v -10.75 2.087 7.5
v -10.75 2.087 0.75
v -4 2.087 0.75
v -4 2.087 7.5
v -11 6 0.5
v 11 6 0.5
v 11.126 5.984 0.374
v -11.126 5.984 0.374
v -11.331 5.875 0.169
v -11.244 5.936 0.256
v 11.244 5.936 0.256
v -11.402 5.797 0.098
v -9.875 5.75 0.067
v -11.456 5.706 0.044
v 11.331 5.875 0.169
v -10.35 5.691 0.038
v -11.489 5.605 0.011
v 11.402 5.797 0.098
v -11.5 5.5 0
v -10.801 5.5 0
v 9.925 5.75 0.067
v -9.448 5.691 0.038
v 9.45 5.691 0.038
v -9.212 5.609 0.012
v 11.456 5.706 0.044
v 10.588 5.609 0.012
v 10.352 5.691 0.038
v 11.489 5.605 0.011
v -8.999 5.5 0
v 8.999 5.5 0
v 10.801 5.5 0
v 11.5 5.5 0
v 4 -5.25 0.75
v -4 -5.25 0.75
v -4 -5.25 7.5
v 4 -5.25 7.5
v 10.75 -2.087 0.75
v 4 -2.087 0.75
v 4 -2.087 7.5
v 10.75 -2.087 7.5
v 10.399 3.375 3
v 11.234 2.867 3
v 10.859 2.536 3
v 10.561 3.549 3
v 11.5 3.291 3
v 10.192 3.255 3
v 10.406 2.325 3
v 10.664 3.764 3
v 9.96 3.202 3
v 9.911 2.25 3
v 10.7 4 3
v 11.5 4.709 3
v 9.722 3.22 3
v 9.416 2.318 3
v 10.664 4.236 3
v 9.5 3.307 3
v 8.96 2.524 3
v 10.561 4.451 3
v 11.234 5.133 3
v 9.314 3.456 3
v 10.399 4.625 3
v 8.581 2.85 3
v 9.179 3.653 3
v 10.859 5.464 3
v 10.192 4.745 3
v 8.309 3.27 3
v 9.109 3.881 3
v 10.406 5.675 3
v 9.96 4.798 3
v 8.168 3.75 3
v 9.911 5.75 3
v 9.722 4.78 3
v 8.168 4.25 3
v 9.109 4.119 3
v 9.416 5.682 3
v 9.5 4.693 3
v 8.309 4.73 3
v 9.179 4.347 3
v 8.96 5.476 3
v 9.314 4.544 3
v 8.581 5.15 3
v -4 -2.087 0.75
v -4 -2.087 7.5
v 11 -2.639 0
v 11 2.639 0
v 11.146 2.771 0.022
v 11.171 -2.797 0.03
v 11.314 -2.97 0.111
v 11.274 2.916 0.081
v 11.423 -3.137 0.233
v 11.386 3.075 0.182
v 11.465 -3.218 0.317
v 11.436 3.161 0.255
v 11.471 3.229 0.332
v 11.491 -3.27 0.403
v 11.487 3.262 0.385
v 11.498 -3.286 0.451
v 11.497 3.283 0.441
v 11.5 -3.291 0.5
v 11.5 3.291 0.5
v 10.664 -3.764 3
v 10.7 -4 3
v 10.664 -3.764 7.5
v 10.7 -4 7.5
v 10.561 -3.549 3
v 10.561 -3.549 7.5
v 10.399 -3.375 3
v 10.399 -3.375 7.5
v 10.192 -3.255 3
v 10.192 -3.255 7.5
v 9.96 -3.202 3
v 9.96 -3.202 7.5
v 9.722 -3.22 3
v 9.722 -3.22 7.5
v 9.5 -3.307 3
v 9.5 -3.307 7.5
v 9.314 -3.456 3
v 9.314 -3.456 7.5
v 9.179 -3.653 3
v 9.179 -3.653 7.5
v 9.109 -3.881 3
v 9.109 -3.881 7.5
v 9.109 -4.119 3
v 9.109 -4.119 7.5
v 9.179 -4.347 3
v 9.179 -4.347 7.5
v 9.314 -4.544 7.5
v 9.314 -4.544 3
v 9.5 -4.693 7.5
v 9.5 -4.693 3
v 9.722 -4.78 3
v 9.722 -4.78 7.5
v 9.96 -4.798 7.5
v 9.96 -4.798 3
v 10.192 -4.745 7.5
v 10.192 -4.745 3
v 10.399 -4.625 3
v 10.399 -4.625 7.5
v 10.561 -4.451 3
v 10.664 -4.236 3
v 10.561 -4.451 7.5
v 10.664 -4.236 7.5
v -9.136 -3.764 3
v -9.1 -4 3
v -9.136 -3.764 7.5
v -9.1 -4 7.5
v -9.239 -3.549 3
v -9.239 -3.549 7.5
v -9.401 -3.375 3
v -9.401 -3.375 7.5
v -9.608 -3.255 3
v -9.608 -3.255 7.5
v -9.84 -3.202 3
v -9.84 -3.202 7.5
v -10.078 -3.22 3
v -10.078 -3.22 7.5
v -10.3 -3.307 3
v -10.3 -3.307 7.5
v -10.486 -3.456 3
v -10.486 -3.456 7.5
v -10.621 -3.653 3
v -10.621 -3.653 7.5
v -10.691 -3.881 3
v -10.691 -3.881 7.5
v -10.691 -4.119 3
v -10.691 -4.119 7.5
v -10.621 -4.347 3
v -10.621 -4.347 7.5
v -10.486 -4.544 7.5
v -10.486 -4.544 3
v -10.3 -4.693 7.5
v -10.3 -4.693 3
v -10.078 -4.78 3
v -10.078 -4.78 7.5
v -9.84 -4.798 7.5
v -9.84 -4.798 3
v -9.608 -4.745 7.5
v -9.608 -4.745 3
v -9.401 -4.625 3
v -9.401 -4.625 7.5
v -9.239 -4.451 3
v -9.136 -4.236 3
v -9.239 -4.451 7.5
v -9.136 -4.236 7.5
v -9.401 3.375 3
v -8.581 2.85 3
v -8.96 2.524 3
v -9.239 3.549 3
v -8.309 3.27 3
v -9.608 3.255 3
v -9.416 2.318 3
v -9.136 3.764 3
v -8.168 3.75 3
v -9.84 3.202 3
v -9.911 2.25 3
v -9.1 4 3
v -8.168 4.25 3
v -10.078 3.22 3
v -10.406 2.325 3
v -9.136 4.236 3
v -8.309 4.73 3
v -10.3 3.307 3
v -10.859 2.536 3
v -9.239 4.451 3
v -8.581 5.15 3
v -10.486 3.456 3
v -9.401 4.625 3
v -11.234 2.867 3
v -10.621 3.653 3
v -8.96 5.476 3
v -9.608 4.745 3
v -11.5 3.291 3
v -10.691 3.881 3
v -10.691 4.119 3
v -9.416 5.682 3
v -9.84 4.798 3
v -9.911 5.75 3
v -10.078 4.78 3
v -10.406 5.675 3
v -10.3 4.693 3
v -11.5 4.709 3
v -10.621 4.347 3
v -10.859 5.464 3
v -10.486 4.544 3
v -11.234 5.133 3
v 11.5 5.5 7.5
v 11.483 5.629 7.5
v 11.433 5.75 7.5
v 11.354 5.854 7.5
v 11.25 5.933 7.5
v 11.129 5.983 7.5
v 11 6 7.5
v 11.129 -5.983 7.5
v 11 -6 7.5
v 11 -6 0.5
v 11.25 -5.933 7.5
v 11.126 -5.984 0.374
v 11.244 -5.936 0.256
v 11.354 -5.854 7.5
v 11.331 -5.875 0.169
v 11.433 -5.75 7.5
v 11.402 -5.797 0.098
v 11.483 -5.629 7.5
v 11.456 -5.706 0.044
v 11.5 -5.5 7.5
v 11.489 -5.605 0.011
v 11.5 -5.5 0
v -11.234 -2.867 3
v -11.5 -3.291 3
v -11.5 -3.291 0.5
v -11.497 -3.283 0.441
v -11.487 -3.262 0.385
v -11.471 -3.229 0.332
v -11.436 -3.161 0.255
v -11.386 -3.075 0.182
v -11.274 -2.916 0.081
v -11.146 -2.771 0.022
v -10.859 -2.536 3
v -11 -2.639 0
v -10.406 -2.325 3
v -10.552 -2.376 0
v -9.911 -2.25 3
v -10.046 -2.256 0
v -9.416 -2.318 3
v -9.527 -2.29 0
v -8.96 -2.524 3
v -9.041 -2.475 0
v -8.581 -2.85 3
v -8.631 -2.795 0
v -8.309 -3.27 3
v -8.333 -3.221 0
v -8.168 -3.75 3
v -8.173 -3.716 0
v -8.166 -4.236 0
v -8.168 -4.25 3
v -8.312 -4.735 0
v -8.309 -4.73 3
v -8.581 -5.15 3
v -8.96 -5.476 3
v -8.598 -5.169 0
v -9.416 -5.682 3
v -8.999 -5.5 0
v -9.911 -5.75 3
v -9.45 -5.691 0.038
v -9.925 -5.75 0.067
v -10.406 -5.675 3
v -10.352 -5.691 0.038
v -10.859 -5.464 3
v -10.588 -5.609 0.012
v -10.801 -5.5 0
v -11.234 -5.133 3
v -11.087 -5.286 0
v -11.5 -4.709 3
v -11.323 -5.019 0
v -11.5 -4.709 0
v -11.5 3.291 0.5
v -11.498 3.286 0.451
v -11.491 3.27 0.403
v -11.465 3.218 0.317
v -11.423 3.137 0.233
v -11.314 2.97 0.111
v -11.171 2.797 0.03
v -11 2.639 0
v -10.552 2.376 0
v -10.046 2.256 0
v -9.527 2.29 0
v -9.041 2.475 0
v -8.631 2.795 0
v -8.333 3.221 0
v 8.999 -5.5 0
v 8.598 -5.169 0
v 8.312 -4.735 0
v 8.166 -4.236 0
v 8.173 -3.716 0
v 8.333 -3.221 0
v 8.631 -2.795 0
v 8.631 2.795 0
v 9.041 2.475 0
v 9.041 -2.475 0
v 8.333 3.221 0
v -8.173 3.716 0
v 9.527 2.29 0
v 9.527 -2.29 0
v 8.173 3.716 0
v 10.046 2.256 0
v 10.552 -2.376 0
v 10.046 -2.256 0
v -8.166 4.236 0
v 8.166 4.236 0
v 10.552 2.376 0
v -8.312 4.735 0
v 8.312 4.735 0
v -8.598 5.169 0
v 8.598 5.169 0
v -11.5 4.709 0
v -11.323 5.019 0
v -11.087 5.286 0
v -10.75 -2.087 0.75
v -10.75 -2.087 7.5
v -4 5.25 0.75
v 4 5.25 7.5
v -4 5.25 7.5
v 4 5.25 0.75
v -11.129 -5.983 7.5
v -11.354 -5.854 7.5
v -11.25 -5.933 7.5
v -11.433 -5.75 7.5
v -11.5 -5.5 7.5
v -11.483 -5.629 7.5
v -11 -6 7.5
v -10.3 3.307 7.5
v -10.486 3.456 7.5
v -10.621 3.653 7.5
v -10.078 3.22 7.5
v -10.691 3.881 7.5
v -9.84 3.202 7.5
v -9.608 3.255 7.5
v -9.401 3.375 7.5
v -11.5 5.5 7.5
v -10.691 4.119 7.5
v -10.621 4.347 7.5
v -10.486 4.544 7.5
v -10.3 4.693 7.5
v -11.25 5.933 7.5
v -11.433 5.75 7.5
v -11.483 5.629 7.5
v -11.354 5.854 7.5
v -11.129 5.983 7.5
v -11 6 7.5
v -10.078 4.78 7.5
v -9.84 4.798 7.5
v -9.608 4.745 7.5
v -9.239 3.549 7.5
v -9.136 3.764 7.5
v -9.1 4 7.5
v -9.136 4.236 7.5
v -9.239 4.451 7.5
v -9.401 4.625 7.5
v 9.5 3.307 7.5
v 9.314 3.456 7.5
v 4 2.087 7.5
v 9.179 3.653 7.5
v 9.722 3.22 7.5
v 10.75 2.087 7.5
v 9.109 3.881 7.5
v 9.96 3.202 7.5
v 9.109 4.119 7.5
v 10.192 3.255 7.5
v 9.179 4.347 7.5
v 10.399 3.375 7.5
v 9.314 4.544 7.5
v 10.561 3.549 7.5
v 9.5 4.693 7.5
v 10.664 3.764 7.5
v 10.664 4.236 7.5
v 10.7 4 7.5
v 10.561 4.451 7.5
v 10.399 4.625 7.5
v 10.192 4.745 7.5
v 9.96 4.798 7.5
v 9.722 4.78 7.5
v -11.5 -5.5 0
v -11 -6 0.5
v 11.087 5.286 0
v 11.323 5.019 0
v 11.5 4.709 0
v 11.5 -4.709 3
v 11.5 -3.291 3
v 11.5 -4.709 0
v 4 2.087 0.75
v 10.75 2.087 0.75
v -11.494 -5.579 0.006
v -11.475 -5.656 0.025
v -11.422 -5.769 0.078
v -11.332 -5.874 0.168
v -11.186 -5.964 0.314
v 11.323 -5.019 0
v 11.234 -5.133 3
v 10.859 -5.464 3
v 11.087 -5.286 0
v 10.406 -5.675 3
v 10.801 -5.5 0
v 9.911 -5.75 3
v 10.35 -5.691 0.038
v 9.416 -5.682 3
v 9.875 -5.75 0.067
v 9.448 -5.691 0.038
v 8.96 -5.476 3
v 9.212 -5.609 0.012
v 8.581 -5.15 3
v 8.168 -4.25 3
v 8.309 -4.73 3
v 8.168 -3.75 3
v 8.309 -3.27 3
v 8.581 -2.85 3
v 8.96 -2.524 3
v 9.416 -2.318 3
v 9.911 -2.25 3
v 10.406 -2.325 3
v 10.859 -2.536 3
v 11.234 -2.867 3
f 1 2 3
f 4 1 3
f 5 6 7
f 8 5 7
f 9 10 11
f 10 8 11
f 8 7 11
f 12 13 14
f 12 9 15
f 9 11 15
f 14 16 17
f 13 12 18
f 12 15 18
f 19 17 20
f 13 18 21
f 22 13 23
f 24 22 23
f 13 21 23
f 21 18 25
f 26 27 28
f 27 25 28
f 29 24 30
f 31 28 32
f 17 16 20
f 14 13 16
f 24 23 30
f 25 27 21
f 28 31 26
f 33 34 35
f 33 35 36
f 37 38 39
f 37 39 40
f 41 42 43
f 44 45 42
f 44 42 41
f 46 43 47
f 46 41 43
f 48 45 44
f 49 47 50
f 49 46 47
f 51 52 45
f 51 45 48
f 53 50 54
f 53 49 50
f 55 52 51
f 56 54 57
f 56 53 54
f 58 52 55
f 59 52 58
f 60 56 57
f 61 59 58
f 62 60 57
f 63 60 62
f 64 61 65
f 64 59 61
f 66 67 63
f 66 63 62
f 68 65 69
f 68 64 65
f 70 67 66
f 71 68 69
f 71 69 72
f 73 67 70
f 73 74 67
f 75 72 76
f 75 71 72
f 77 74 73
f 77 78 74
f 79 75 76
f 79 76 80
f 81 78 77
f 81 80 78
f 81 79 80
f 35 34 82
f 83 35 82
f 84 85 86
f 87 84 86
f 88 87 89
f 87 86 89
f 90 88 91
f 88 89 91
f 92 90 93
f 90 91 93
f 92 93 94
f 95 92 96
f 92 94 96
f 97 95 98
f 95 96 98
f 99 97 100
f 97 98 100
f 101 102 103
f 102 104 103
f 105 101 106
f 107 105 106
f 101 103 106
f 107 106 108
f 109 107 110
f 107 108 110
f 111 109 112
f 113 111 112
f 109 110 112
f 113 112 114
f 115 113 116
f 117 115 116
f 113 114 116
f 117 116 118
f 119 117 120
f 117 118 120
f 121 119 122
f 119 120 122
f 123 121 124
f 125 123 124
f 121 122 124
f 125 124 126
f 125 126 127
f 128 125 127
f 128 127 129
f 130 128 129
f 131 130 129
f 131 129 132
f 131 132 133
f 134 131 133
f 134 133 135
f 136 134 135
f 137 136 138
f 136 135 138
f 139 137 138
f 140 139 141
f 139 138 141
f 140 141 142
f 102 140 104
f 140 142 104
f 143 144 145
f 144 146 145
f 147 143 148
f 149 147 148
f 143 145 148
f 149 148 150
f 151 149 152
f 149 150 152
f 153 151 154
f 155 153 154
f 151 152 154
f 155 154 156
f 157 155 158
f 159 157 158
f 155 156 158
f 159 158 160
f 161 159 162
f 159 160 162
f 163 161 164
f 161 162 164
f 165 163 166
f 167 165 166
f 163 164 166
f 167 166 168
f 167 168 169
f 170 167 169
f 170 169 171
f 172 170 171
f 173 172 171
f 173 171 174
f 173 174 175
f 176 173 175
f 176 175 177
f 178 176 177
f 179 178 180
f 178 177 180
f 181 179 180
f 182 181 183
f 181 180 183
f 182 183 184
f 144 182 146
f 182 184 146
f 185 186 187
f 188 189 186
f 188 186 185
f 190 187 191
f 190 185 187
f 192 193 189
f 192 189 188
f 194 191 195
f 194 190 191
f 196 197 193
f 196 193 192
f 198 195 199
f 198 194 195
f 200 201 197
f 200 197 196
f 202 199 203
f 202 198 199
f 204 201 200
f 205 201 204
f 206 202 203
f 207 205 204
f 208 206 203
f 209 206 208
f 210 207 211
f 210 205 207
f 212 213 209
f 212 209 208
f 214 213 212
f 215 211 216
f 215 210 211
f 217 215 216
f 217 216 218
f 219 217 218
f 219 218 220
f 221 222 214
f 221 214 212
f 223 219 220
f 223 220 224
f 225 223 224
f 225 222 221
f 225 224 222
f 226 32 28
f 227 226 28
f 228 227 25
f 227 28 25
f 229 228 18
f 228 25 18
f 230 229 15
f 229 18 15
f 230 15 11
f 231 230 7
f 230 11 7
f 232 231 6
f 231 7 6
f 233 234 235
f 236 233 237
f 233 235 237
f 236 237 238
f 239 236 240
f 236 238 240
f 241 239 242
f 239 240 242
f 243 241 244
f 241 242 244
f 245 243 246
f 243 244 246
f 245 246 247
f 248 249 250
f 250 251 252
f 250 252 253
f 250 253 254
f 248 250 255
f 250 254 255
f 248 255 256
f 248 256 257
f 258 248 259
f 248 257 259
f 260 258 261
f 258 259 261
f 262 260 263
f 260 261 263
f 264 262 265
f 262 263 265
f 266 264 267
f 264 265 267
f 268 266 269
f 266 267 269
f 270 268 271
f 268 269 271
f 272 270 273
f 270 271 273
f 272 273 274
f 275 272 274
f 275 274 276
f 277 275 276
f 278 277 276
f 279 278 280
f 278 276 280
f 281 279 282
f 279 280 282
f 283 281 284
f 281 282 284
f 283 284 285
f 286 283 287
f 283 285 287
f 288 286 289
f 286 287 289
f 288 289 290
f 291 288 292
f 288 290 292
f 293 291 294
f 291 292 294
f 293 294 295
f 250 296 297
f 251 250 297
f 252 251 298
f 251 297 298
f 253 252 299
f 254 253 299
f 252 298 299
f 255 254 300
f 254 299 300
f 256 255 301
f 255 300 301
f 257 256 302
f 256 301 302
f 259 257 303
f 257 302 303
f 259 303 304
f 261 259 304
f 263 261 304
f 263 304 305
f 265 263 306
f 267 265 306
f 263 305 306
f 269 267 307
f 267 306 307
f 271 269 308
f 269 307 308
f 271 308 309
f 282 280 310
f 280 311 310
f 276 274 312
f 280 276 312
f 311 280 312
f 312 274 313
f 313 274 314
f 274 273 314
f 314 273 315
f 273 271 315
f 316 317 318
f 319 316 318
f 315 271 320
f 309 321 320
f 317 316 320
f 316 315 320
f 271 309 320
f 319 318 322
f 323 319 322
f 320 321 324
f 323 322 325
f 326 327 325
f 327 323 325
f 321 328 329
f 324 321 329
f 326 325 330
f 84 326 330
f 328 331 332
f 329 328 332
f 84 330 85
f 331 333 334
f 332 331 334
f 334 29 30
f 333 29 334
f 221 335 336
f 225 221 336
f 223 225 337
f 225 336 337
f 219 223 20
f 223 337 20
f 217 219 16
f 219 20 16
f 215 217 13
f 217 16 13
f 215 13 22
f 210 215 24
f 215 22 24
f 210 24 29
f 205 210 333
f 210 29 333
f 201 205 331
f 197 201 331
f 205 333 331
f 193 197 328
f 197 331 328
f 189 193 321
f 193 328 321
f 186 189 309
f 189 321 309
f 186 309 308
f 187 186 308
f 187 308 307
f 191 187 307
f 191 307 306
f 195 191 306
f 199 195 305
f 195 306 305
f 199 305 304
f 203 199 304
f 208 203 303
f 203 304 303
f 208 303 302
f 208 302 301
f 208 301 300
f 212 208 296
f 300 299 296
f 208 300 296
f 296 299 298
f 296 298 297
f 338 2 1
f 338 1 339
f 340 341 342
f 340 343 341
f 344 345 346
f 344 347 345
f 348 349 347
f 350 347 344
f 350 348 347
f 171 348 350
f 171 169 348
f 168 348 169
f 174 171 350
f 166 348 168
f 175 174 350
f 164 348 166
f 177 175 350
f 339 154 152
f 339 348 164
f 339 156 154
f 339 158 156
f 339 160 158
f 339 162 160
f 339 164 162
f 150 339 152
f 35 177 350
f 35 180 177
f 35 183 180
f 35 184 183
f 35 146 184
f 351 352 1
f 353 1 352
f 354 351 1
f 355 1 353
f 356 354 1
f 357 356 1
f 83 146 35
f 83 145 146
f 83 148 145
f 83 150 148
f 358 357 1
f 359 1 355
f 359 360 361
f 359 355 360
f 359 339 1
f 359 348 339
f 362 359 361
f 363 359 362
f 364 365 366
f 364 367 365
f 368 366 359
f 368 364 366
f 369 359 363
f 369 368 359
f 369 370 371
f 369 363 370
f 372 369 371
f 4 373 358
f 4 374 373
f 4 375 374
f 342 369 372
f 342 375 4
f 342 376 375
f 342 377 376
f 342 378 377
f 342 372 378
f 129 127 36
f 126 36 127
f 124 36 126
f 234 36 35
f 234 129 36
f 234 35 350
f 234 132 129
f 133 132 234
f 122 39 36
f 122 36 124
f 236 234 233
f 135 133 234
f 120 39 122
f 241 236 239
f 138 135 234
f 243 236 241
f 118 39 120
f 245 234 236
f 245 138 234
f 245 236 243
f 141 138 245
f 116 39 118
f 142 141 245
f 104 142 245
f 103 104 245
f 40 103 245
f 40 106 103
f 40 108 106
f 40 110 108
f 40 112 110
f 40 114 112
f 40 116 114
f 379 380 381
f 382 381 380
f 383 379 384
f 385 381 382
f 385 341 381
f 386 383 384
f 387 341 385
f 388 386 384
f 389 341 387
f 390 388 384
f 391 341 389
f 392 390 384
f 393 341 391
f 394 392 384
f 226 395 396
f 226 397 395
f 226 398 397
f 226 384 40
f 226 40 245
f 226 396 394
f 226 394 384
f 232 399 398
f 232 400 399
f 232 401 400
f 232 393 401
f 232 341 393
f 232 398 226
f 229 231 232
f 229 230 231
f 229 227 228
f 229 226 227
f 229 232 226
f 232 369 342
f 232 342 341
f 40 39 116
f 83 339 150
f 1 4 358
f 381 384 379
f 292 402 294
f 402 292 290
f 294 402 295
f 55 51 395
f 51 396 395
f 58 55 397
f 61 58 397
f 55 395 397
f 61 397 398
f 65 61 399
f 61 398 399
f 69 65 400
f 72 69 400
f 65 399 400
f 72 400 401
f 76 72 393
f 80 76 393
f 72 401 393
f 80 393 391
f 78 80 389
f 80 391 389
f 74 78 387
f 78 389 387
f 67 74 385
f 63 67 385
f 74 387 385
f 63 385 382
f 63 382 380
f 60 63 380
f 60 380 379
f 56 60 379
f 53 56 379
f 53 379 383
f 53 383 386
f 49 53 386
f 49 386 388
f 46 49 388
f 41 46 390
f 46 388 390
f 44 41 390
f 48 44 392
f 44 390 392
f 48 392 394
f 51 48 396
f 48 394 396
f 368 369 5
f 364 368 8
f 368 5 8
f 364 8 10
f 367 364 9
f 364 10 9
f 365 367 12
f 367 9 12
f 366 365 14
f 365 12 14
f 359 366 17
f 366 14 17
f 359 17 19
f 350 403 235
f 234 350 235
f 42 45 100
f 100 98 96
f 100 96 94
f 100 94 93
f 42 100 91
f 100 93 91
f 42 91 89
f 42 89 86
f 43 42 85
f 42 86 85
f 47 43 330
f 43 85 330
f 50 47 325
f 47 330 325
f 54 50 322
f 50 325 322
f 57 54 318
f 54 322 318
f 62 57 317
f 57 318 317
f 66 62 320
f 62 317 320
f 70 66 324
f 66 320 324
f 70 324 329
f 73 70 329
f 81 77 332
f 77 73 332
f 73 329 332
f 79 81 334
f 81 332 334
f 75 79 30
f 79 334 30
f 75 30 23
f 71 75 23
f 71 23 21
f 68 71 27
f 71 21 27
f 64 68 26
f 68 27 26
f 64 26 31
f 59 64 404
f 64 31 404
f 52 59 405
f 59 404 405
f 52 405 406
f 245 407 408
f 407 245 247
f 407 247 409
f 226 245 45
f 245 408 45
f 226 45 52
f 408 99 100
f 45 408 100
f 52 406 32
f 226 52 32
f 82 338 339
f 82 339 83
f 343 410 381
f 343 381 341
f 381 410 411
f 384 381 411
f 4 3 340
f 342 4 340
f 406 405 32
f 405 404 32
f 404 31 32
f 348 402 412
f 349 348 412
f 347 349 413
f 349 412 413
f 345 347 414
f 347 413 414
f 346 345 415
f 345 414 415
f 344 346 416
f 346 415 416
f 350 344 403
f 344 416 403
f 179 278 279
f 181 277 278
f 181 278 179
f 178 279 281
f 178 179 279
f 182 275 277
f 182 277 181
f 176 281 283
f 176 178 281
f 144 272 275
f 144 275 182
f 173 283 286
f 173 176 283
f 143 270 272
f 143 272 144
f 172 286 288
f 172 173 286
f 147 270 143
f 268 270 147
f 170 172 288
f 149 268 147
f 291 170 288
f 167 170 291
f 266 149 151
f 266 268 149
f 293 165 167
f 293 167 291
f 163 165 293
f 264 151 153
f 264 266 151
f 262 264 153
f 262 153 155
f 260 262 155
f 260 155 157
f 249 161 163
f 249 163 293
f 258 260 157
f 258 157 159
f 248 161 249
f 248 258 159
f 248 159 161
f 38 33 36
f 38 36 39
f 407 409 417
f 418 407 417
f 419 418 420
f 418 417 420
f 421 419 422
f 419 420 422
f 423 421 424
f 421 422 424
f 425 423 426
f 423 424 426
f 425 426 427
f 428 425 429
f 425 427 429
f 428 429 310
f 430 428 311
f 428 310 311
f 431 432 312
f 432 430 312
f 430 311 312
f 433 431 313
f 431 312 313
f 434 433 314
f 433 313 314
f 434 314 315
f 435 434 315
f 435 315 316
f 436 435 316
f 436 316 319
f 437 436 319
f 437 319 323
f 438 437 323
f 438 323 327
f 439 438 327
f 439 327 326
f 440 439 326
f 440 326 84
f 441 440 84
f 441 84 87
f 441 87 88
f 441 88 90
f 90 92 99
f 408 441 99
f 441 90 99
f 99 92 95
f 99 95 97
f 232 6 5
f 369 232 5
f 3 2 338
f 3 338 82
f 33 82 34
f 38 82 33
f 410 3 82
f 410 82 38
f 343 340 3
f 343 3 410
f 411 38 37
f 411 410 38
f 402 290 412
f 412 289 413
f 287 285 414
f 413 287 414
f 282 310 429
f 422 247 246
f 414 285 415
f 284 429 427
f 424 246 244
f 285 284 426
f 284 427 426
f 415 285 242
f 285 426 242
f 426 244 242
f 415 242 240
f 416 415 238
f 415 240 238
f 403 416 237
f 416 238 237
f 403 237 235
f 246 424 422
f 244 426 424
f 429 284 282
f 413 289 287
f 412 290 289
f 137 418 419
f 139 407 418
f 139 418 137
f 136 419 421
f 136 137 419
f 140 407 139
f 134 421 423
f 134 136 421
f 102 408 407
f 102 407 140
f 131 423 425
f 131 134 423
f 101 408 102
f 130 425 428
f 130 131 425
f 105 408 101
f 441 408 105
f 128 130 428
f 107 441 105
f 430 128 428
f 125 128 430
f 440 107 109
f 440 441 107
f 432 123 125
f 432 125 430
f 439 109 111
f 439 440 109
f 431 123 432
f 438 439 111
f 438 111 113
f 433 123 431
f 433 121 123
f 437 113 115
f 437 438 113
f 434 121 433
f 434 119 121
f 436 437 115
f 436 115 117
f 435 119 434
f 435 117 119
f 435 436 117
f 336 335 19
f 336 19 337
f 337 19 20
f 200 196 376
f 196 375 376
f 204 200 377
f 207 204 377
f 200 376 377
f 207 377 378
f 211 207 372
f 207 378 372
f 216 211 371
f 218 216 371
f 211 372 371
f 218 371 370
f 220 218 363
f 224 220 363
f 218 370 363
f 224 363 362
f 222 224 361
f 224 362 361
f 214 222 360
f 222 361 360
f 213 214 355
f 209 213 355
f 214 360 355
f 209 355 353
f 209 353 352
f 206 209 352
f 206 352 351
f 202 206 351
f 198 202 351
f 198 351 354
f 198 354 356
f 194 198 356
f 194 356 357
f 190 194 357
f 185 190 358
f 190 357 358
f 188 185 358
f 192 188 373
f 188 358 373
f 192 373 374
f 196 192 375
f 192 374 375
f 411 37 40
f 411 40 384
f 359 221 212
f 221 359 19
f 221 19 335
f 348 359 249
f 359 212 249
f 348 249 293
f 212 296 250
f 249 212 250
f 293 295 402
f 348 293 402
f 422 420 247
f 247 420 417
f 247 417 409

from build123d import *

# Parameters (mm, degrees)
SKETCH1_W           = 7.5
SKETCH1_H           = 3.913043478
BOSS_EXTRUDE1_DEPTH = 7.5
SHELL2_T            = -0.75
SKETCH1_4_W         = 7.5
SKETCH1_4_H         = 3.913043478
BOSS_EXTRUDE2_DEPTH = 7.5
HOLE2_D             = 1.6
HOLE2_DEPTH         = 10
HOLE2_CBORE_D       = 3.5
HOLE2_CBORE_DEPTH   = 3
FILLET1_R           = 0.5


with BuildPart() as part:
    # Sketch1 → Boss-Extrude1 (new body)
    with BuildSketch(Plane.XY):
        Polygon((4, 2.086956522), (4, 6), (-4, 6), (-4, 2.086956522), (-11.5, 2.086956522), (-11.5, -2.086956522), (-4, -2.086956522), (-4, -6), (4, -6), (4, -2.086956522), (11.5, -2.086956522), (11.5, 2.086956522), align=None)
        with Locations((-7.75, 4.043478261)):
            Rectangle(SKETCH1_W, SKETCH1_H)
        with Locations((7.75, 4.043478261)):
            Rectangle(SKETCH1_W, SKETCH1_H)
        with Locations((-7.75, -4.043478261)):
            Rectangle(SKETCH1_W, SKETCH1_H)
        with Locations((7.75, -4.043478261)):
            Rectangle(SKETCH1_W, SKETCH1_H)
    extrude(amount=BOSS_EXTRUDE1_DEPTH)

    # Shell2
    shell2_openings = [part.faces().sort_by_distance(p)[0] for p in [
        (0, 0, 7.5),
    ]]
    offset(amount=SHELL2_T, openings=shell2_openings, kind=Kind.INTERSECTION)

    # Sketch1<4> → Boss-Extrude2 (add)
    with BuildSketch(Plane.XY):
        with Locations((7.75, 4.043478261)):
            Rectangle(SKETCH1_4_W, SKETCH1_4_H)
        with Locations((-7.75, 4.043478261)):
            Rectangle(SKETCH1_4_W, SKETCH1_4_H)
        with Locations((-7.75, -4.043478261)):
            Rectangle(SKETCH1_4_W, SKETCH1_4_H)
        with Locations((7.75, -4.043478261)):
            Rectangle(SKETCH1_4_W, SKETCH1_4_H)
    extrude(amount=BOSS_EXTRUDE2_DEPTH)

    # Hole2
    with Locations(Plane(origin=(0, 0, 0), x_dir=(-1, 0, 0), z_dir=(0, 0, -1))):
        with Locations((-9.9, -4), (9.9, 4), (9.9, -4), (-9.9, 4)):
            CounterBoreHole(HOLE2_D / 2, HOLE2_CBORE_D / 2, HOLE2_CBORE_DEPTH, depth=HOLE2_DEPTH)

    # Fillet1
    # the kernel refuses this fillet: 0.5 mm, written as the material it takes off along each edge
    with BuildSketch(Plane(origin=(-11.5, 6, -1.25), x_dir=(1, 0, 0), z_dir=(0, 0, 1)), Plane(origin=(11.5, -6, -1.25), x_dir=(-1, 0, 0), z_dir=(0, 0, 1))) as fillet1_piece_1:
        with BuildLine():
            CenterArc((FILLET1_R, -FILLET1_R), FILLET1_R, 90, 90)
            Line((0, -FILLET1_R), (0, 0))
            Line((0, 0), (FILLET1_R, 0))
        make_face()
    extrude(amount=10, mode=Mode.SUBTRACT)
    with BuildSketch(Plane(origin=(-11.5, 4.541127656, 0), x_dir=(1, 0, 0), z_dir=(0, -1, 0)), Plane(origin=(11.5, 4.541127656, 0), x_dir=(0, 0, 1), z_dir=(0, -1, 0))) as fillet1_piece_2:
        with BuildLine():
            CenterArc((FILLET1_R, FILLET1_R), FILLET1_R, 180, 90)
            Line((0, FILLET1_R), (0, 0))
            Line((0, 0), (FILLET1_R, 0))
        make_face()
    extrude(amount=9.082255312, mode=Mode.SUBTRACT)
    with BuildSketch(Plane(origin=(12.75, 6, 0), x_dir=(0, 0, 1), z_dir=(-1, 0, 0))) as fillet1_piece_3:
        with BuildLine():
            CenterArc((FILLET1_R, -FILLET1_R), FILLET1_R, 90, 90)
            Line((0, -FILLET1_R), (0, 0))
            Line((0, 0), (FILLET1_R, 0))
        make_face()
    extrude(amount=25.5, mode=Mode.SUBTRACT)
    with BuildSketch(Plane(origin=(11.5, 6, -1.25), x_dir=(-1, 0, 0), z_dir=(0, 0, 1)), Plane(origin=(-11.5, -6, -1.25), x_dir=(1, 0, 0), z_dir=(0, 0, 1))) as fillet1_piece_4:
        with BuildLine():
            CenterArc((FILLET1_R, FILLET1_R), FILLET1_R, 180, 90)
            Line((0, FILLET1_R), (0, 0))
            Line((0, 0), (FILLET1_R, 0))
        make_face()
    extrude(amount=10, mode=Mode.SUBTRACT)
    with BuildSketch(Plane(origin=(12.75, -6, 0), x_dir=(0, 0, 1), z_dir=(-1, 0, 0))) as fillet1_piece_5:
        with BuildLine():
            CenterArc((FILLET1_R, FILLET1_R), FILLET1_R, 180, 90)
            Line((0, FILLET1_R), (0, 0))
            Line((0, 0), (FILLET1_R, 0))
        make_face()
    extrude(amount=25.5, mode=Mode.SUBTRACT)


solid = part.part
